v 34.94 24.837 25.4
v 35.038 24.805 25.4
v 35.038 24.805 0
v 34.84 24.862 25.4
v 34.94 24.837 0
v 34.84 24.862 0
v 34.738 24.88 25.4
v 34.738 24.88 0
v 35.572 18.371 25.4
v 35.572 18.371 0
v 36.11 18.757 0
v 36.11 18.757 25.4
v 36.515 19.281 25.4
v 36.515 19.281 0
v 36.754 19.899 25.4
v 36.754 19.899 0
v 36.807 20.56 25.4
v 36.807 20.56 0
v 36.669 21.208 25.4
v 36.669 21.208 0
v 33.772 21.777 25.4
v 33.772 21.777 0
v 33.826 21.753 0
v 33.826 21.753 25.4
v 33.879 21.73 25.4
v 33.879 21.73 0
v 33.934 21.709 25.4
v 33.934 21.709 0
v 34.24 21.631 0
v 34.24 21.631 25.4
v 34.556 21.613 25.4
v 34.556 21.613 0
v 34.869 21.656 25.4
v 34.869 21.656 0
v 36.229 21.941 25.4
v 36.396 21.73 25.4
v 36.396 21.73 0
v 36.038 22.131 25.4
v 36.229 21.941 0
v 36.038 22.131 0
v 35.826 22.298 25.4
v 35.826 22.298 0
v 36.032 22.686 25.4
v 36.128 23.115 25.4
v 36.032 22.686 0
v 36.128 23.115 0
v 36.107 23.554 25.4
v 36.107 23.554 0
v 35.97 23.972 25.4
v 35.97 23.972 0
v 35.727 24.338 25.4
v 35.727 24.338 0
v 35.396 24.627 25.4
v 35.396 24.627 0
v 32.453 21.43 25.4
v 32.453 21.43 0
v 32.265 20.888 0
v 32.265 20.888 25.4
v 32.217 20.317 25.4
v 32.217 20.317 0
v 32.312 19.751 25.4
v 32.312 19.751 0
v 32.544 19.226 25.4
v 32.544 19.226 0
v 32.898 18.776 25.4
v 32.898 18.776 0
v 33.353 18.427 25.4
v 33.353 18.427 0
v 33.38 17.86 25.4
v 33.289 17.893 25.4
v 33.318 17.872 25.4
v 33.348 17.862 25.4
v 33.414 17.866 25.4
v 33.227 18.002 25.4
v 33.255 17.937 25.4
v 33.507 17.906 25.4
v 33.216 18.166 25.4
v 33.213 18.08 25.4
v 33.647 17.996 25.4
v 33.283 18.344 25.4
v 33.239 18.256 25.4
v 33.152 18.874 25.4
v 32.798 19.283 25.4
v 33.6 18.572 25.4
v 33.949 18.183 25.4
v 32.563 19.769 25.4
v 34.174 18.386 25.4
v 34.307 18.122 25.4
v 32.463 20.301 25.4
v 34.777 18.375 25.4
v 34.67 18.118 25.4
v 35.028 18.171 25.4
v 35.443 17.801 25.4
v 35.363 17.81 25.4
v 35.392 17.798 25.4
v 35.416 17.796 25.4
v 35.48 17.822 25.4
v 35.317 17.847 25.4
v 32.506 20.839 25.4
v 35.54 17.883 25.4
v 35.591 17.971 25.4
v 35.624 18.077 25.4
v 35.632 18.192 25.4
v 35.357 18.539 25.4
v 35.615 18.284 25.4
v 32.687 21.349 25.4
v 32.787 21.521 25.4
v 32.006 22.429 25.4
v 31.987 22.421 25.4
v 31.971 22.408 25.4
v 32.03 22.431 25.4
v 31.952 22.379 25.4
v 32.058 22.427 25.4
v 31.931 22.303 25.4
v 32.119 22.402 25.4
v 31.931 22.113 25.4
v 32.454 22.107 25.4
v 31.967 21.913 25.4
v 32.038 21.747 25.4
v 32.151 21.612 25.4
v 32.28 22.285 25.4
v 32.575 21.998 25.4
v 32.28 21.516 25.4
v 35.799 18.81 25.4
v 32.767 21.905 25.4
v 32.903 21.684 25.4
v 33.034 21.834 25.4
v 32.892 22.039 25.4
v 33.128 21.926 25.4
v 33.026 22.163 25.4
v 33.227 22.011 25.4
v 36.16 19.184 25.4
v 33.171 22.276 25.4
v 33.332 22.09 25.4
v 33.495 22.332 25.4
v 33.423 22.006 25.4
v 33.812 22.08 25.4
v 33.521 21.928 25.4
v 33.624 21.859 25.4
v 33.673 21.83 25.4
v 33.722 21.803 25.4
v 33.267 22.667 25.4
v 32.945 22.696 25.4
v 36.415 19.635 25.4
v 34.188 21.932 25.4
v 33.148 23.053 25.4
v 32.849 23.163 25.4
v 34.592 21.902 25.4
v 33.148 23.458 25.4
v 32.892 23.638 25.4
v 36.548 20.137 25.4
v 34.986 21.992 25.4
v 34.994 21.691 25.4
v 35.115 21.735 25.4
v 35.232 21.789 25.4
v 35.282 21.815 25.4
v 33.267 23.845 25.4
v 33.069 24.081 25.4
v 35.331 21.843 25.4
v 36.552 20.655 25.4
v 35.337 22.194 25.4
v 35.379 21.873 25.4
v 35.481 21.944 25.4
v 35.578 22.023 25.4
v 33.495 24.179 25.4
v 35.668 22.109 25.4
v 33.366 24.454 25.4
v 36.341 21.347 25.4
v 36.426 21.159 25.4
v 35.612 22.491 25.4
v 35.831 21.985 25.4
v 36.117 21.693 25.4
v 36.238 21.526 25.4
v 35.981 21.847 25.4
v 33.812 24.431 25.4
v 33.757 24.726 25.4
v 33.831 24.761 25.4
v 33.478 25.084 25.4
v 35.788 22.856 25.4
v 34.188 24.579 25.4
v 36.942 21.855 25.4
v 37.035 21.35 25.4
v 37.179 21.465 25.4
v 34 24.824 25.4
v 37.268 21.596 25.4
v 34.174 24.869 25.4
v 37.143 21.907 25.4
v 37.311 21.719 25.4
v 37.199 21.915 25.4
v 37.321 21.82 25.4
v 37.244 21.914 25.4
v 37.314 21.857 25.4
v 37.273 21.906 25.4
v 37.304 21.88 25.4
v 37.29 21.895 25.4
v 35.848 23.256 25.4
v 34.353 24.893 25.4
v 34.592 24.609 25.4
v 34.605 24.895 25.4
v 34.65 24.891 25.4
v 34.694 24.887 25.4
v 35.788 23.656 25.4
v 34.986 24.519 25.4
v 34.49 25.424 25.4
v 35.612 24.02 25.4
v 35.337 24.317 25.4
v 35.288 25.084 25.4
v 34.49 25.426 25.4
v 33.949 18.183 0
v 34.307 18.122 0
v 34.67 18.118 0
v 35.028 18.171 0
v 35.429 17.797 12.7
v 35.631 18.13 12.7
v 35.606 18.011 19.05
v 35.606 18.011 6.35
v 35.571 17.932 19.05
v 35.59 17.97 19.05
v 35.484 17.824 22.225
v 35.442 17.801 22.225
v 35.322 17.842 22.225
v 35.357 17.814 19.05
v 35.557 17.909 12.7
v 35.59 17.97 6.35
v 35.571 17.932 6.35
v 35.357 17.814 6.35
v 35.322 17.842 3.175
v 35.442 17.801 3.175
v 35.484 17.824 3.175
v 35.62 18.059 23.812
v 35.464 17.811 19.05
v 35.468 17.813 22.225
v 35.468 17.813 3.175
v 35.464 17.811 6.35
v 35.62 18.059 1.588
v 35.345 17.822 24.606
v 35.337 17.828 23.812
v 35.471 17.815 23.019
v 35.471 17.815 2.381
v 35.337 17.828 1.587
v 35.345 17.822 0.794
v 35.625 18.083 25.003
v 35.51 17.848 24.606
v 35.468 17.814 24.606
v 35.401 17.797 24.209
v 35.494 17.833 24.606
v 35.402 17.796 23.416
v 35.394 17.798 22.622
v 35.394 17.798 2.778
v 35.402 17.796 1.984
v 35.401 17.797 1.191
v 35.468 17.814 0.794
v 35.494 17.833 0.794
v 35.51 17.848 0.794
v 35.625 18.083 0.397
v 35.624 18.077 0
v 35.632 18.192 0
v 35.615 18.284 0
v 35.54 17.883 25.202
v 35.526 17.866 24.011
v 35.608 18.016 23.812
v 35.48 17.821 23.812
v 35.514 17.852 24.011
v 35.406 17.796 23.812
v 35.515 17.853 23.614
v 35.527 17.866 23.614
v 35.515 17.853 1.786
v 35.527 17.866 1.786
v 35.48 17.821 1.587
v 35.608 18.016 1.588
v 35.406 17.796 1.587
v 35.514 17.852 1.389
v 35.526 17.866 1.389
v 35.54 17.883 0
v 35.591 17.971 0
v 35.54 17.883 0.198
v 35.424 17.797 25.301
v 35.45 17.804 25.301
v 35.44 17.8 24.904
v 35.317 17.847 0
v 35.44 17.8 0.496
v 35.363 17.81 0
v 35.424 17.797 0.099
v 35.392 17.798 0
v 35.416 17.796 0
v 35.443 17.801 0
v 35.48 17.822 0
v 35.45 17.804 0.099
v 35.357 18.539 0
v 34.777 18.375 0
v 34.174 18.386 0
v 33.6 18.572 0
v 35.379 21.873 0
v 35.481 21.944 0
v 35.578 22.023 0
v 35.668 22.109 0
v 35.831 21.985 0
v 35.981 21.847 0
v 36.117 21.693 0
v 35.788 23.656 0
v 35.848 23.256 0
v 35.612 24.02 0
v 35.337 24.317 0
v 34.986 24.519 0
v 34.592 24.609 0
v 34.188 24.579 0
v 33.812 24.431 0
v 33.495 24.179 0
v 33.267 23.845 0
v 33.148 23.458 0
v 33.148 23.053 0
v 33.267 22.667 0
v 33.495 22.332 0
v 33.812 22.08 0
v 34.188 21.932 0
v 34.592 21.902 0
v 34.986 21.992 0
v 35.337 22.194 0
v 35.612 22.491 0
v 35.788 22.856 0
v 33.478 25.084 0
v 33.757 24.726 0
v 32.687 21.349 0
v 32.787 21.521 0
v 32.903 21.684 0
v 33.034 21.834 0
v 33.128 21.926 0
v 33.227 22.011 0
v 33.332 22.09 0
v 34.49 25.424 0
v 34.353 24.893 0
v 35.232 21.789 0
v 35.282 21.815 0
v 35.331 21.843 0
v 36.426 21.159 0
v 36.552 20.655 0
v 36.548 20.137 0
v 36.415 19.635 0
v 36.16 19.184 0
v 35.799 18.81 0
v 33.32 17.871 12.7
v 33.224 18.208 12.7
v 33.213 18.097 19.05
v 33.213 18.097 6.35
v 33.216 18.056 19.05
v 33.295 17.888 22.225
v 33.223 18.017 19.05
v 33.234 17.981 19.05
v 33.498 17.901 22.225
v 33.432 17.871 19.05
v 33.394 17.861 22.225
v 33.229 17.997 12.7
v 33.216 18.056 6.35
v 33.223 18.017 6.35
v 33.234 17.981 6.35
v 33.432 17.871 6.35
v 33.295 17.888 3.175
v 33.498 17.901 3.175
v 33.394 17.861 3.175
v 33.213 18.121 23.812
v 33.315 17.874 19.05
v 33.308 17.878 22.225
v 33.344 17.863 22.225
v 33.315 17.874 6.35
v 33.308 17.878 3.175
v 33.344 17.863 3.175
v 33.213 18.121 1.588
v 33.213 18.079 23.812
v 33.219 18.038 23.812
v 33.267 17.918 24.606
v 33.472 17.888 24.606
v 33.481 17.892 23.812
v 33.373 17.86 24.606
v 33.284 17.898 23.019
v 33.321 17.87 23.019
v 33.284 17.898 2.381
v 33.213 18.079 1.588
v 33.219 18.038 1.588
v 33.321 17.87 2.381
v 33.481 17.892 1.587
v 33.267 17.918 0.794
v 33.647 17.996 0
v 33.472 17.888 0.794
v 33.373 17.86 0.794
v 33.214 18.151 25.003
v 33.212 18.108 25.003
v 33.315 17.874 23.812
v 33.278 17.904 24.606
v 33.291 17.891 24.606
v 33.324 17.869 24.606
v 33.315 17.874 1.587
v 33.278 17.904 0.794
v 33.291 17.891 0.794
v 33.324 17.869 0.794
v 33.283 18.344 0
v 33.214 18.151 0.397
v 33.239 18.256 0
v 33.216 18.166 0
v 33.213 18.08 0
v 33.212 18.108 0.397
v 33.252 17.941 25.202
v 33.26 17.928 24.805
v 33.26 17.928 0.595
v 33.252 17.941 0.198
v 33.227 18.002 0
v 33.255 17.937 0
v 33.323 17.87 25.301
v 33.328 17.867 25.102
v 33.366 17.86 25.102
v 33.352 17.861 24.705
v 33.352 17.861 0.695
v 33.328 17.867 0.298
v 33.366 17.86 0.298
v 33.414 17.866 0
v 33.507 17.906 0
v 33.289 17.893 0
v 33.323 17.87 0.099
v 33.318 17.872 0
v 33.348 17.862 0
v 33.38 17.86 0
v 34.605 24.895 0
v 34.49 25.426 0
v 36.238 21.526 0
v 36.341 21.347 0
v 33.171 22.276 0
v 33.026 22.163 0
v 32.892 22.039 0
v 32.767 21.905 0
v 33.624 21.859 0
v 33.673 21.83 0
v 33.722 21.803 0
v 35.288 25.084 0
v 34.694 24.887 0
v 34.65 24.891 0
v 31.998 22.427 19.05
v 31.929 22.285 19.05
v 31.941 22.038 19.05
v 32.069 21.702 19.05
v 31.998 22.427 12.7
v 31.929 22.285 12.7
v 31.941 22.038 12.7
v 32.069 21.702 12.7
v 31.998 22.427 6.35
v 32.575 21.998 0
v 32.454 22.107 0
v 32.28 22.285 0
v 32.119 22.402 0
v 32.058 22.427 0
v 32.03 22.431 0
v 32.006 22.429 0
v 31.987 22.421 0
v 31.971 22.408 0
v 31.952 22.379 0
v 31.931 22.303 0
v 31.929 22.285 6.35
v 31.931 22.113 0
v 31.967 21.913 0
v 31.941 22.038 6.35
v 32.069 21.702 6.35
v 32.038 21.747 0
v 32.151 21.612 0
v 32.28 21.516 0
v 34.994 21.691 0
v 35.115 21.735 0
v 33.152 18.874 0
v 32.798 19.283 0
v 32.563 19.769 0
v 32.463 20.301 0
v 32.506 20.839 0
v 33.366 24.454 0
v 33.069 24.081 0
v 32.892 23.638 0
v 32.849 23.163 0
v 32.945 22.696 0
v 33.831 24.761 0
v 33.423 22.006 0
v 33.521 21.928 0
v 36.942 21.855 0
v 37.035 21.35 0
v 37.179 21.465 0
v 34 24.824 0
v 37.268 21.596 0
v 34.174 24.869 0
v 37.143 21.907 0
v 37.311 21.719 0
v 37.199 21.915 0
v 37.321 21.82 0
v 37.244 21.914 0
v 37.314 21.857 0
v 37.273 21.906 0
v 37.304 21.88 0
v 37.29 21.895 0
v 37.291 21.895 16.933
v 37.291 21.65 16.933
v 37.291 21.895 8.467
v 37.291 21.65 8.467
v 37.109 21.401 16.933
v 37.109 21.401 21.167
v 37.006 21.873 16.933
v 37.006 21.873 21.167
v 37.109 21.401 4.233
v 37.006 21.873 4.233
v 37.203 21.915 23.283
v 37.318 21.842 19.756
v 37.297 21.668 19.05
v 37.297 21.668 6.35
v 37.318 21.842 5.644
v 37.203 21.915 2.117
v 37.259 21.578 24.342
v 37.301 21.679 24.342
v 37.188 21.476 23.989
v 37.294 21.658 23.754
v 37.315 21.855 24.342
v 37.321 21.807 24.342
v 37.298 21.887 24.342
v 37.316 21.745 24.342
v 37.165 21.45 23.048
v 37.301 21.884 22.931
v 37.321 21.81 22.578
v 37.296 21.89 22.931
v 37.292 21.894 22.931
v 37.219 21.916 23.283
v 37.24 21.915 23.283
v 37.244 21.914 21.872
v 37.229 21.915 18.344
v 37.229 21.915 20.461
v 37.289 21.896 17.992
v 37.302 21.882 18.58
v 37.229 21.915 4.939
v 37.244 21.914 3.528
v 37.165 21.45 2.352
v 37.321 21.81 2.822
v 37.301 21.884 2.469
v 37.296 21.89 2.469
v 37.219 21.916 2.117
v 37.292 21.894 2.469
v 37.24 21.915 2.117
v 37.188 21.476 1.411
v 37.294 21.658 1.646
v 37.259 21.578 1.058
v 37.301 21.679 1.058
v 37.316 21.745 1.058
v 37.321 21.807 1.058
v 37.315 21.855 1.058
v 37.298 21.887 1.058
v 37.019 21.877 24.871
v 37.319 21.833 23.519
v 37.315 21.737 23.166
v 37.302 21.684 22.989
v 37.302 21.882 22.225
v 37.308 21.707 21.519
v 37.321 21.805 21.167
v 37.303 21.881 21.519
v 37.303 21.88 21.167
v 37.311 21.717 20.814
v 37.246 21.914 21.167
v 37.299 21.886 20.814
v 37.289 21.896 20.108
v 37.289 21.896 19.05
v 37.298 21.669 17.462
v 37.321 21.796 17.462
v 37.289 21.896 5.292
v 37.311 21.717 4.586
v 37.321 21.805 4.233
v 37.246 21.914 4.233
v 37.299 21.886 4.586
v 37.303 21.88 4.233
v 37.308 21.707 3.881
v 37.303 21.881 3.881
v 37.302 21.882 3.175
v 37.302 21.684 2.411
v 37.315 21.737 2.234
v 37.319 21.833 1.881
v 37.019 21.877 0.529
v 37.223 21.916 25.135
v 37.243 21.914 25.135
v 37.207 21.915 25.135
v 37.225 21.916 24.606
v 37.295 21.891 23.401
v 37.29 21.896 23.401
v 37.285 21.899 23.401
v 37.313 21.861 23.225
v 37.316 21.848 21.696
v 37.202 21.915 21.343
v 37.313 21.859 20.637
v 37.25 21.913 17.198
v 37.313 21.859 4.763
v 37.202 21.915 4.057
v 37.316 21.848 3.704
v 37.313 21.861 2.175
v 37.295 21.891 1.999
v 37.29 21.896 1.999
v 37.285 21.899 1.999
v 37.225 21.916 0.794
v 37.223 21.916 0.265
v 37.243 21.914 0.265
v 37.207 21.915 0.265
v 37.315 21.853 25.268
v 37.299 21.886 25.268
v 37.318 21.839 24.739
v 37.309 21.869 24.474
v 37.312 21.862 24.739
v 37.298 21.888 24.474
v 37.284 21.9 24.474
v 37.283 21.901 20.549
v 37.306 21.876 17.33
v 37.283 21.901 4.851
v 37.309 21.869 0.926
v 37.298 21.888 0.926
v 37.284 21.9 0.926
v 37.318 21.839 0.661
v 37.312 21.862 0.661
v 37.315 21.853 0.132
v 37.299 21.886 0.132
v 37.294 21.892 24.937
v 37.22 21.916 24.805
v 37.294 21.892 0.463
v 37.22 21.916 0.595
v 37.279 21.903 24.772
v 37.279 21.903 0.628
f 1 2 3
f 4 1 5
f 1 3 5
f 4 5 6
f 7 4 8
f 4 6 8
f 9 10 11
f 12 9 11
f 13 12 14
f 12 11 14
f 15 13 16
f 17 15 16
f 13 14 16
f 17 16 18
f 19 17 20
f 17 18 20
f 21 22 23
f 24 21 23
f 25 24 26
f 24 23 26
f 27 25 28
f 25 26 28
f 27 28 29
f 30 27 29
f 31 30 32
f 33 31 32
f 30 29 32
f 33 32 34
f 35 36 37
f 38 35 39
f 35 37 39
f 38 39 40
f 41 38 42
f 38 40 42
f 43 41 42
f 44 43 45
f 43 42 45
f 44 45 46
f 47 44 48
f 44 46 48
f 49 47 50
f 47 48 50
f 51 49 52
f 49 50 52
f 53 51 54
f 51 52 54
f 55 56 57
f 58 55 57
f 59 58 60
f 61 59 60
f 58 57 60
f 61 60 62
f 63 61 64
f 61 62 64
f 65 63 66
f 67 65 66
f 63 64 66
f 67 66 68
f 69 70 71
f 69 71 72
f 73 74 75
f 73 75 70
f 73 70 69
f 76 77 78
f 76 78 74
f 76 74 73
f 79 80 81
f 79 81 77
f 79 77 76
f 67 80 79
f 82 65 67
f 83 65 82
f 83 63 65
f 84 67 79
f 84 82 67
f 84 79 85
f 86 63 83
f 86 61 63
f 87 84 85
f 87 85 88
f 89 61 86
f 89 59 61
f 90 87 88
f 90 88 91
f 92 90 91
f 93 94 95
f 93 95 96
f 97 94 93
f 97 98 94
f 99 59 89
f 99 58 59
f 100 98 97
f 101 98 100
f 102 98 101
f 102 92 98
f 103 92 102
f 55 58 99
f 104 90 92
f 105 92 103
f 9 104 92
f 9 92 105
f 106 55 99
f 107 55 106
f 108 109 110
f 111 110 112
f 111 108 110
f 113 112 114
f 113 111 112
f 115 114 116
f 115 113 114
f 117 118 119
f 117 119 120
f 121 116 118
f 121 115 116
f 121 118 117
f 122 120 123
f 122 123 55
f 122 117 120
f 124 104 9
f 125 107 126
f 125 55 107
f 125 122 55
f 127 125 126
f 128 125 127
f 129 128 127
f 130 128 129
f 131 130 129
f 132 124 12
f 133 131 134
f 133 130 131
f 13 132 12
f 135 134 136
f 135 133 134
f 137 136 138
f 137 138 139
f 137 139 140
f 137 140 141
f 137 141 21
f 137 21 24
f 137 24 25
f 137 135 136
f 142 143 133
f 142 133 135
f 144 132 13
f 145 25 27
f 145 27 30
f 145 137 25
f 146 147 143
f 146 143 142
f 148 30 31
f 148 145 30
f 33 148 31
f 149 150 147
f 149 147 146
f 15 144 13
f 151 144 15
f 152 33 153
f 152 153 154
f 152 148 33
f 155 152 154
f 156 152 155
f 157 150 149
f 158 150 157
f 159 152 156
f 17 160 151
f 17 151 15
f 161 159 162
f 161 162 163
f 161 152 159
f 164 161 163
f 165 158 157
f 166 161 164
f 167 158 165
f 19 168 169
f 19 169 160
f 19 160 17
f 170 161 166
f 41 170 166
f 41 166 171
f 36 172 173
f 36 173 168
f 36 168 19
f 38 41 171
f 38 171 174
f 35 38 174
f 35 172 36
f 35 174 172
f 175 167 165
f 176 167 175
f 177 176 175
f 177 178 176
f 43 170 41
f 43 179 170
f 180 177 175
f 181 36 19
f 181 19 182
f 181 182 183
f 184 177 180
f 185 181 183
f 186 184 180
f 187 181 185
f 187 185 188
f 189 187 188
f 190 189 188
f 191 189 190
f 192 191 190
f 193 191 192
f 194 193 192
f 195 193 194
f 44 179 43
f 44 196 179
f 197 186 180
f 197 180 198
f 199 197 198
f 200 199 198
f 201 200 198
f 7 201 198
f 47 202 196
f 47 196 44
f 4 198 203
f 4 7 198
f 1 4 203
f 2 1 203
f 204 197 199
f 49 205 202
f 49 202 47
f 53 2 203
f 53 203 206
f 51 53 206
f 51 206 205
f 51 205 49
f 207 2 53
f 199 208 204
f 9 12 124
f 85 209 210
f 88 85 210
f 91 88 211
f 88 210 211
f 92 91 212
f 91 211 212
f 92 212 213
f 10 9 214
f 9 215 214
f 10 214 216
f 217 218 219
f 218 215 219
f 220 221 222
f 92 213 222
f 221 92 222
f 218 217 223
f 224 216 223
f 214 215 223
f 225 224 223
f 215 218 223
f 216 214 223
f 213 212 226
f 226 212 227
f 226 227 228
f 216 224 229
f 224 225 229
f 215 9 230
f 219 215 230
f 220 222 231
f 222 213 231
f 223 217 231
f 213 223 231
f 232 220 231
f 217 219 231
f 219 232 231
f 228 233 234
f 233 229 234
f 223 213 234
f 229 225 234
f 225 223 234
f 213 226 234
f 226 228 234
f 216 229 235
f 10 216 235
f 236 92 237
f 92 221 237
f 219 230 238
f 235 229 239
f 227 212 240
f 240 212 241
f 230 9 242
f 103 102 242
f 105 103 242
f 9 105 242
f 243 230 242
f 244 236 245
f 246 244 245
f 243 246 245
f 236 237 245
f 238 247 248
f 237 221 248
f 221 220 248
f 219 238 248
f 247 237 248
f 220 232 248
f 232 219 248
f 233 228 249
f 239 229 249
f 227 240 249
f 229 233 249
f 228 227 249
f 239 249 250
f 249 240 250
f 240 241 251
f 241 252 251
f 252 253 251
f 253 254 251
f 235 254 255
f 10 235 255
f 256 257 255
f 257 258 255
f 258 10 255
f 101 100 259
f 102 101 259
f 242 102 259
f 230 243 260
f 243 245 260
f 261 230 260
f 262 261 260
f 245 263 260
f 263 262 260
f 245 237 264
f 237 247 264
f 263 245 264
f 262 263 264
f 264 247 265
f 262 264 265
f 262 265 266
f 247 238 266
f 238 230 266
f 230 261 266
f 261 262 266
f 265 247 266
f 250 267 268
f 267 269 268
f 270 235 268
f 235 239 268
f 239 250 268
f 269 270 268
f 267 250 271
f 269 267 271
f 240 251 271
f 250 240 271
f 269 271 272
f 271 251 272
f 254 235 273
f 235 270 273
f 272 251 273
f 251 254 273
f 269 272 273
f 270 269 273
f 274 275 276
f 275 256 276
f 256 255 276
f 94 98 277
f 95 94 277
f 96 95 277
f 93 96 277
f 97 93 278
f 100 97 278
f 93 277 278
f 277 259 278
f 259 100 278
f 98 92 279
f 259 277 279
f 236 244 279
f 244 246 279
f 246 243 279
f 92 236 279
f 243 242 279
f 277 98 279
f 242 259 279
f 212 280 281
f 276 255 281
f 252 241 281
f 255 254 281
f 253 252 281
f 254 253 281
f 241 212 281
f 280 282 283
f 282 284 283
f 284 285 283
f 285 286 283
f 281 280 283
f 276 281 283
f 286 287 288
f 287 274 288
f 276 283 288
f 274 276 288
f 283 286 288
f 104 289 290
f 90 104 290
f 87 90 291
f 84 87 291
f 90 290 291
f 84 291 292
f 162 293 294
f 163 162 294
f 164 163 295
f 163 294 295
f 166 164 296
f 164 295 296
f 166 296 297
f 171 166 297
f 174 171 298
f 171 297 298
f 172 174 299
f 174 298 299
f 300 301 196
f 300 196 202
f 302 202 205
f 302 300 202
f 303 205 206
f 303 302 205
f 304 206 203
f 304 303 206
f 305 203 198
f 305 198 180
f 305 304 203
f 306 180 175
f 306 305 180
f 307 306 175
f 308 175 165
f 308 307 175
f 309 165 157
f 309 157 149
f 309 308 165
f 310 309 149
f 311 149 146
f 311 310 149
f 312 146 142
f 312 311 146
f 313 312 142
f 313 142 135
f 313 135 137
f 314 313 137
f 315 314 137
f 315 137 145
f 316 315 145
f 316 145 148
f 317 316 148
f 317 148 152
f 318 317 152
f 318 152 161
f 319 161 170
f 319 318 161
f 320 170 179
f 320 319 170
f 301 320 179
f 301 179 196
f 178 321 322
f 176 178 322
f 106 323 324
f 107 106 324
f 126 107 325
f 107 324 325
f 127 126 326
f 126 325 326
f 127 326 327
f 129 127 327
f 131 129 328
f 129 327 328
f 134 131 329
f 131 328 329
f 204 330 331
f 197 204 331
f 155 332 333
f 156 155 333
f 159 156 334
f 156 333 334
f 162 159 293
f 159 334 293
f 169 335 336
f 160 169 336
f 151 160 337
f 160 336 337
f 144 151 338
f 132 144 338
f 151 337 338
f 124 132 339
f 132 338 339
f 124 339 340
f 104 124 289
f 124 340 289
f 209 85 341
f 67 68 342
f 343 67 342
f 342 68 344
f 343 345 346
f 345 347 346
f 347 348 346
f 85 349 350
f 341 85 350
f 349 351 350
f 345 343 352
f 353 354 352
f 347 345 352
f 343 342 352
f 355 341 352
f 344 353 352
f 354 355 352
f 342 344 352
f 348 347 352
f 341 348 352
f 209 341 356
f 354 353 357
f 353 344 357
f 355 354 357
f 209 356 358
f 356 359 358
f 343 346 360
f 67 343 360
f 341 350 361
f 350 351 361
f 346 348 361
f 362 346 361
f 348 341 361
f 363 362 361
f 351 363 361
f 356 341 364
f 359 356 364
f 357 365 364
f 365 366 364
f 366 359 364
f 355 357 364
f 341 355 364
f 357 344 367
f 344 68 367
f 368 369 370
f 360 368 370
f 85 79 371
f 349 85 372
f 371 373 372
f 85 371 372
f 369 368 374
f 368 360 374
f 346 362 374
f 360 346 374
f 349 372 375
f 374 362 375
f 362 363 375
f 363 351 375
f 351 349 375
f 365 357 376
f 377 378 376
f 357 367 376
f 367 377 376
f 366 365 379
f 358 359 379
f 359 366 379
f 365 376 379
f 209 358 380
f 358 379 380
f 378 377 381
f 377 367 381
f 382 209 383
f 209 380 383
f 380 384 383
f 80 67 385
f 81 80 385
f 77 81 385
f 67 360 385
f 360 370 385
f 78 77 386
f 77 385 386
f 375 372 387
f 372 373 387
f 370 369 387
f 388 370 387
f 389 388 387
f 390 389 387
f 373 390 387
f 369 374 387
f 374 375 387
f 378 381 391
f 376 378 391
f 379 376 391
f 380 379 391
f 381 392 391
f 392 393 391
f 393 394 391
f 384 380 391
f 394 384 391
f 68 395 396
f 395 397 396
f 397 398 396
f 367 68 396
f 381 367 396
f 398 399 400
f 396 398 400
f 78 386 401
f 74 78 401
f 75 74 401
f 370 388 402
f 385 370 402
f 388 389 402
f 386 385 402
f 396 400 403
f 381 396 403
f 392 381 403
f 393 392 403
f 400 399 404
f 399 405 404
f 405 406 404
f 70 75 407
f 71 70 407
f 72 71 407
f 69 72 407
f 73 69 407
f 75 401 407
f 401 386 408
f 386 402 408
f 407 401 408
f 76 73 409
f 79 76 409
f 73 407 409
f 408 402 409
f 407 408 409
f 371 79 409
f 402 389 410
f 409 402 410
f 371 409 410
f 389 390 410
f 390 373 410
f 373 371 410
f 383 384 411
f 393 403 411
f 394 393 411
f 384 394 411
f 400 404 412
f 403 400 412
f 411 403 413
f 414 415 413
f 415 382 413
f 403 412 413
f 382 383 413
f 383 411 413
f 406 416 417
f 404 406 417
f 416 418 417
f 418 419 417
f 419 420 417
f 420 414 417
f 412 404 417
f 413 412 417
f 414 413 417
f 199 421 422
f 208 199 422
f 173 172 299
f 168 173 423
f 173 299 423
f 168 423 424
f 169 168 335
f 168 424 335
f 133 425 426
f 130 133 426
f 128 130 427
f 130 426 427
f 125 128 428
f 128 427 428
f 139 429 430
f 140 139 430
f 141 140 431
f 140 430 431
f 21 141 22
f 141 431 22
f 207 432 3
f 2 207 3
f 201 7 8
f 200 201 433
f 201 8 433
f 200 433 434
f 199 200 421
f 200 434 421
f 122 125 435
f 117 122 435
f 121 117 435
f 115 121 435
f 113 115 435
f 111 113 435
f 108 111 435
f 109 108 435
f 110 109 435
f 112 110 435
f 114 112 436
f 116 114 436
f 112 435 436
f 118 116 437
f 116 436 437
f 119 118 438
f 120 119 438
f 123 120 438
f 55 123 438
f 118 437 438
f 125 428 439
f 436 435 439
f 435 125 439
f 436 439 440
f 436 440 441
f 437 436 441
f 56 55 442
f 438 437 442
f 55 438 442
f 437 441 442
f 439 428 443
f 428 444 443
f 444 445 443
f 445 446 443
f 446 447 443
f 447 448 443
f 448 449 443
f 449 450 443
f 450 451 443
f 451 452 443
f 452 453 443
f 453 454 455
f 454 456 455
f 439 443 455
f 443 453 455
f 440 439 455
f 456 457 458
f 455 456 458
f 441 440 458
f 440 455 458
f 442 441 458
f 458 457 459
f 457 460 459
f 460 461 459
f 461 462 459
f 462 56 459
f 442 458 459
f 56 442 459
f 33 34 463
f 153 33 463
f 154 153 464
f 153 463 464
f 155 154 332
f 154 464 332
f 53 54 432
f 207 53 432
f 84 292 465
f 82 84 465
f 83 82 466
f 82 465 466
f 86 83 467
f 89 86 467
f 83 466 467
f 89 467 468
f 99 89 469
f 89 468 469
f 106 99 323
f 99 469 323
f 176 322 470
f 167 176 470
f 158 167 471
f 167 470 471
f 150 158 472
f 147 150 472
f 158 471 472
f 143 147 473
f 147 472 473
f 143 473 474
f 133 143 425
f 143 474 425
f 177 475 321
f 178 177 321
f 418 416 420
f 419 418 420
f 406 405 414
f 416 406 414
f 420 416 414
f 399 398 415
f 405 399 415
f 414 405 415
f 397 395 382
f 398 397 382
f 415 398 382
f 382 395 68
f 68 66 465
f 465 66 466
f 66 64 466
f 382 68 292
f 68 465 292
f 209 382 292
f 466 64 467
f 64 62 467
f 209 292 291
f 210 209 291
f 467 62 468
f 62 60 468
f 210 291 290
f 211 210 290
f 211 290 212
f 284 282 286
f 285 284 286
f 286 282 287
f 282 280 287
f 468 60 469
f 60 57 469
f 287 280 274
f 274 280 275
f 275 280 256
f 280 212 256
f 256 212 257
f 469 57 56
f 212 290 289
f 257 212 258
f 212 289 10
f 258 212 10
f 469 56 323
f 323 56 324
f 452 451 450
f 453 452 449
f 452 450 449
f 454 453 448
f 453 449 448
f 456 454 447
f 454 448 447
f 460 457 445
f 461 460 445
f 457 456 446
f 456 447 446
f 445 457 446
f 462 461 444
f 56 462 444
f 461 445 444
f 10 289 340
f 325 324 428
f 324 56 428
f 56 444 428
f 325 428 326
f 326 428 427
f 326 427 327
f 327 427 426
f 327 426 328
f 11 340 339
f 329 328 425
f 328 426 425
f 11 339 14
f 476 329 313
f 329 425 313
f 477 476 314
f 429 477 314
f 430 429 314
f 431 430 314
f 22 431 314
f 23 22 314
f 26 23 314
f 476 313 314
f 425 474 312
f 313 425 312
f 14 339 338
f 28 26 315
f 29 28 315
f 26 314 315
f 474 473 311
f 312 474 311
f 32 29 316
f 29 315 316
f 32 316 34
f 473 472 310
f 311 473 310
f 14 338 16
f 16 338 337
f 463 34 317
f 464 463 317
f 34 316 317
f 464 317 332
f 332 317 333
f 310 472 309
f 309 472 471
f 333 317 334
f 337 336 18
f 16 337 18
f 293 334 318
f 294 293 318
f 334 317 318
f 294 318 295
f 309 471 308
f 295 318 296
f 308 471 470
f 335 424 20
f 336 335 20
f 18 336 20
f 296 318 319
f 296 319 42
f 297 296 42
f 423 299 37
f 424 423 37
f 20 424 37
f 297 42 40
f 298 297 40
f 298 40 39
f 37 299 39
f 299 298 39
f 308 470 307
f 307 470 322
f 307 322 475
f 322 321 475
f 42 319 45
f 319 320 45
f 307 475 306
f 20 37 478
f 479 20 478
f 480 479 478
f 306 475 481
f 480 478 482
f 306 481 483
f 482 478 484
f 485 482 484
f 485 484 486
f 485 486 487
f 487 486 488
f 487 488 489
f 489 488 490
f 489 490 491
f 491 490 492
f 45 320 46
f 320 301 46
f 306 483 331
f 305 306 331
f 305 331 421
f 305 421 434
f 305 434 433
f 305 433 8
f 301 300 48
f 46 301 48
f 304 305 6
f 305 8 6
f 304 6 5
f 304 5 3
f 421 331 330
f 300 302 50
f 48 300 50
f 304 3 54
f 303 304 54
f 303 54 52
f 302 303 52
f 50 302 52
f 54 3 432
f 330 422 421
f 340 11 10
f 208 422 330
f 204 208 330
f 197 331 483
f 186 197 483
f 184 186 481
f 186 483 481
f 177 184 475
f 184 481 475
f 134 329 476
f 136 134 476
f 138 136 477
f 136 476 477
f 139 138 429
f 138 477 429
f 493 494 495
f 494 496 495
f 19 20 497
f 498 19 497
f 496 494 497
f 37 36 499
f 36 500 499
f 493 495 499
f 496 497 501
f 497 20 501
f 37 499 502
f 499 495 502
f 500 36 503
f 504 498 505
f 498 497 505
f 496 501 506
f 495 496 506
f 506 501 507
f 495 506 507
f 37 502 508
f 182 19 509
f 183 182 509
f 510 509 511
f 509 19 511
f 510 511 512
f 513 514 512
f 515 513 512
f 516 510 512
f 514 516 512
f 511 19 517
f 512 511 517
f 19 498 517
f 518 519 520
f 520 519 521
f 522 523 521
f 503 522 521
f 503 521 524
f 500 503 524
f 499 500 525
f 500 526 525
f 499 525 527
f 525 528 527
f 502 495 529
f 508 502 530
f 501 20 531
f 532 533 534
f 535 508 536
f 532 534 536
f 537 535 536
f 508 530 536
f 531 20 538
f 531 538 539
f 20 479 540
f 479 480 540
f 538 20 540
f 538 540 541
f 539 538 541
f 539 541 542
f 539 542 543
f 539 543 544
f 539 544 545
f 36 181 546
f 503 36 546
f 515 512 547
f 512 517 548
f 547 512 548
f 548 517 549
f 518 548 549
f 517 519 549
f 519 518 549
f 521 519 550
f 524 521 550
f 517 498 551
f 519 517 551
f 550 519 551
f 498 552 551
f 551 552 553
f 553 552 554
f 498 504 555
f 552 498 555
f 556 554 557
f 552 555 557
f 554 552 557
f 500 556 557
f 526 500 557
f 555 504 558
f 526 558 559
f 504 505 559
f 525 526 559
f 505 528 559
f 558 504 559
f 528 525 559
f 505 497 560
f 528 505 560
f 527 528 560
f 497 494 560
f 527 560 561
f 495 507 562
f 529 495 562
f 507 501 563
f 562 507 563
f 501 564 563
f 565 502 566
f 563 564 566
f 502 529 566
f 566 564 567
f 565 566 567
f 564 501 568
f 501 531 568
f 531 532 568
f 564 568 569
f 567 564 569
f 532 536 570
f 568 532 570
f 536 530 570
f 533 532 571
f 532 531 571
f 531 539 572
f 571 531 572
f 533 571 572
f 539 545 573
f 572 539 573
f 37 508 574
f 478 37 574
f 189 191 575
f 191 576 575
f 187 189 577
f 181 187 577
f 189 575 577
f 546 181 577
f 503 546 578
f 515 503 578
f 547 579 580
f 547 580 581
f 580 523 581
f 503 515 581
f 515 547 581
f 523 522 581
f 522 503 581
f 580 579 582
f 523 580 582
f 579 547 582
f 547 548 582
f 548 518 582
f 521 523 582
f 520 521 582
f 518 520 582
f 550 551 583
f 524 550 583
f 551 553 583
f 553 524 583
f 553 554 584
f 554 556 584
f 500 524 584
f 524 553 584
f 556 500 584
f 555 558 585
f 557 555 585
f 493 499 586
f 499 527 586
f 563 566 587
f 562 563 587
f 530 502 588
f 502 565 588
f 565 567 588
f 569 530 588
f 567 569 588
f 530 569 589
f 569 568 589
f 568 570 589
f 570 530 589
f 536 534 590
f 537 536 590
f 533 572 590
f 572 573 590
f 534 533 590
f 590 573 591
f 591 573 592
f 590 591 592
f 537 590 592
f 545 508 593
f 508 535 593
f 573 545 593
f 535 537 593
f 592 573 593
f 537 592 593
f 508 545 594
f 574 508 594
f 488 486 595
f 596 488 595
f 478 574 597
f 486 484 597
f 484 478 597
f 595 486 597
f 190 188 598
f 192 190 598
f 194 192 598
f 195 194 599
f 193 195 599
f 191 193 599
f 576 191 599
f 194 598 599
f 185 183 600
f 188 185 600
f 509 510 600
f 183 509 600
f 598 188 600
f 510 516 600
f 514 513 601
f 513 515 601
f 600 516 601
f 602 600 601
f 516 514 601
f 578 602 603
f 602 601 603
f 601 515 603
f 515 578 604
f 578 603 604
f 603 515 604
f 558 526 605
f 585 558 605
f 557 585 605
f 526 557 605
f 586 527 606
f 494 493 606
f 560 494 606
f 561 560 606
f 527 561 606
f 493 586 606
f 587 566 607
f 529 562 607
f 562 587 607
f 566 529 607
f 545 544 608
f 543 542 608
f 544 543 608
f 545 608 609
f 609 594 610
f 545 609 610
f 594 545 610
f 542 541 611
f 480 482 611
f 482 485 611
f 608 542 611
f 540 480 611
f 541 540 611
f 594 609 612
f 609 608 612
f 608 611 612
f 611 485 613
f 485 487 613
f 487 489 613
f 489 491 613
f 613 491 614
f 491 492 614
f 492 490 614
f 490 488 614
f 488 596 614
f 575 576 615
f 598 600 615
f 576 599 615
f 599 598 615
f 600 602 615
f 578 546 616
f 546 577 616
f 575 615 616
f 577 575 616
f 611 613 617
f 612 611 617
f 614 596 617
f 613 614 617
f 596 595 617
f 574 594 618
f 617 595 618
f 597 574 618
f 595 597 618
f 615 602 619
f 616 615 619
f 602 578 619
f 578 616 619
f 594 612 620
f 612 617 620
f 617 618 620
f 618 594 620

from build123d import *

# Parameters (mm, degrees)
F0_R     = 1.3574899336
F1_DEPTH = 25.4


with BuildPart() as f1:
    # F0 (on Top) → F1 (new body)
    with BuildSketch(Plane.XY):
        with BuildLine():
            Line((35.2878831327, 25.0843970505), (35.0384411812, 24.8051633126))
            ThreePointArc((35.0384411812, 24.8051633126), (34.8900331306, 24.8498952124), (34.7380711454, 24.8804475838))
            ThreePointArc((34.7380711454, 24.8804475838), (34.6718324932, 24.8891687339), (34.6052941294, 24.8951906649))
            ThreePointArc((34.6052941294, 24.8951906649), (34.4790949379, 24.8991686132), (34.3529627664, 24.8934471338))
            ThreePointArc((34.3529627664, 24.8934471338), (34.0864715287, 24.84878651), (33.8308991876, 24.7610657624))
            ThreePointArc((33.8308991876, 24.7610657624), (33.7935953989, 24.7441653158), (33.7567242747, 24.7263406713))
            ThreePointArc((33.7567242747, 24.7263406713), (32.8919741005, 23.6379870392), (33.1706458564, 22.2761322214))
            ThreePointArc((33.1706458564, 22.2761322214), (33.2477936638, 22.1799429615), (33.331935669, 22.0898081689))
            ThreePointArc((33.331935669, 22.0898081689), (33.4714507341, 21.9660817612), (33.624082862, 21.8589551498))
            ThreePointArc((33.624082862, 21.8589551498), (33.6972022109, 21.8161682858), (33.7724291489, 21.7772059613))
            ThreePointArc((33.7724291489, 21.7772059613), (33.8523875779, 21.7409790551), (33.9341661368, 21.7090728424))
            add(Edge.make_bspline(
                [(34.8690945447, 21.6562799961), (34.5503462489, 21.6638848484), (34.2300963573, 21.682290249), (33.9341661368, 21.7090728424)],
                knots=[0.8742249562, 0.8742249562, 0.8742249562, 0.8742249562, 0.9209885647, 0.9209885647, 0.9209885647, 0.9209885647], degree=3))
            ThreePointArc((34.8690945447, 21.6562799961), (35.054677069, 21.7119521289), (35.2324185413, 21.7890768896))
            ThreePointArc((35.2324185413, 21.7890768896), (35.3070019831, 21.8292572971), (35.3794159251, 21.8732274679))
            ThreePointArc((35.3794159251, 21.8732274679), (35.5302859315, 21.982821804), (35.6677706867, 22.1088004507))
            ThreePointArc((35.6677706867, 22.1088004507), (35.7504359225, 22.200291525), (35.826009436, 22.2977225363))
            ThreePointArc((35.826009436, 22.2977225363), (36.1066779775, 23.5541858288), (35.3956624922, 24.6274666939))
            Line((35.3956624922, 24.6274666939), (35.2878831327, 25.0843970505))
        make_face()
        with Locations((34.4904512167, 23.2556387782)):
            Circle(F0_R, mode=Mode.SUBTRACT)
        Polygon((34.4900014006, 25.4237678916), (34.6052941294, 24.8951906649), (34.4904512167, 25.4255086183), align=None)
        with BuildLine():
            ThreePointArc((34.3529627664, 24.8934471338), (34.4790949379, 24.8991686132), (34.6052941294, 24.8951906649))
            Line((34.6052941294, 24.8951906649), (34.4900014006, 25.4237678916))
            Line((34.4900014006, 25.4237678916), (34.3529627664, 24.8934471338))
        make_face()
        with BuildLine():
            ThreePointArc((36.3961035597, 21.729501502), (36.1361243059, 22.0387624609), (35.826009436, 22.2977225363))
            ThreePointArc((35.826009436, 22.2977225363), (35.7504359225, 22.200291525), (35.6677706867, 22.1088004507))
            ThreePointArc((35.6677706867, 22.1088004507), (35.9078628578, 21.9178867809), (36.1168310715, 21.6933326324))
            add(Edge.make_bspline(
                [(36.3961035597, 21.729501502), (36.3090749695, 21.7153973416), (36.2155393433, 21.7033827965), (36.1168310715, 21.6933326324)],
                knots=[0.7920048431, 0.7920048431, 0.7920048431, 0.7920048431, 0.8094233051, 0.8094233051, 0.8094233051, 0.8094233051], degree=3))
        make_face()
        with BuildLine():
            ThreePointArc((33.7567242747, 24.7263406713), (33.7935953989, 24.7441653158), (33.8308991876, 24.7610657624))
            Line((33.8308991876, 24.7610657624), (33.4780786019, 25.0843970505))
            Line((33.4780786019, 25.0843970505), (33.7567242747, 24.7263406713))
        make_face()
        with BuildLine():
            add(Edge.make_bspline(
                [(36.6693598159, 21.2079252289), (37.0767596252, 21.3101548698), (37.3116579362, 21.5662061593), (37.3529850038, 22.0550492964), (36.9161573246, 21.8137832496), (36.3961035597, 21.729501502)],
                knots=[0.5386602181, 0.5386602181, 0.5386602181, 0.5386602181, 0.6339632831, 0.6879179364, 0.7920048431, 0.7920048431, 0.7920048431, 0.7920048431], degree=3))
            add(Edge.make_bspline(
                [(36.3961035597, 21.729501502), (36.3090749695, 21.7153973416), (36.2155393433, 21.7033827965), (36.1168310715, 21.6933326324)],
                knots=[0.7920048431, 0.7920048431, 0.7920048431, 0.7920048431, 0.8094233051, 0.8094233051, 0.8094233051, 0.8094233051], degree=3))
            ThreePointArc((36.1168310715, 21.6933326324), (36.2914503946, 21.437661713), (36.4256376999, 21.1586396813))
            add(Edge.make_bspline(
                [(36.4256376999, 21.1586396813), (36.5143437357, 21.1731050665), (36.5960224931, 21.1895225492), (36.6693598159, 21.2079252289)],
                knots=[0.5215044131, 0.5215044131, 0.5215044131, 0.5215044131, 0.5386602181, 0.5386602181, 0.5386602181, 0.5386602181], degree=3))
        make_face()
        with BuildLine():
            ThreePointArc((35.5719280309, 18.3706314653), (36.65722528, 19.581735003), (36.6693598159, 21.2079252289))
            add(Edge.make_bspline(
                [(36.4256376999, 21.1586396813), (36.5143437357, 21.1731050665), (36.5960224931, 21.1895225492), (36.6693598159, 21.2079252289)],
                knots=[0.5215044131, 0.5215044131, 0.5215044131, 0.5215044131, 0.5386602181, 0.5386602181, 0.5386602181, 0.5386602181], degree=3))
            ThreePointArc((36.4256376999, 21.1586396813), (36.4145776308, 19.6354161553), (35.3570595451, 18.5390641437))
            add(Edge.make_bspline(
                [(35.5719280309, 18.3706314653), (35.5261594748, 18.4364082043), (35.4517435721, 18.492565667), (35.3570595451, 18.5390641437)],
                knots=[0.7349975613, 0.7349975613, 0.7349975613, 0.7349975613, 0.7758927384, 0.7758927384, 0.7758927384, 0.7758927384], degree=3))
        make_face()
        with BuildLine():
            ThreePointArc((33.331935669, 22.0898081689), (33.2477936638, 22.1799429615), (33.1706458564, 22.2761322214))
            ThreePointArc((33.1706458564, 22.2761322214), (32.9577020916, 22.1025904709), (32.7669837029, 21.9048829033))
            add(Edge.make_bspline(
                [(33.0339498666, 21.8341794774), (32.9292845175, 21.856390058), (32.8391193359, 21.8800682788), (32.7669837029, 21.9048829033)],
                knots=[0.9759112078, 0.9759112078, 0.9759112078, 0.9759112078, 1, 1, 1, 1], degree=3))
            ThreePointArc((33.0339498666, 21.8341794774), (33.1768182667, 21.9691331407), (33.331935669, 22.0898081689))
        make_face()
        with BuildLine():
            add(Edge.make_bspline(
                [(35.0284066637, 18.1708643732), (35.2170583716, 18.0273126704), (35.3967964234, 17.5080415665), (35.724938715, 18.1507306273), (35.5719280309, 18.3706314653)],
                knots=[0.4666277679, 0.4666277679, 0.4666277679, 0.4666277679, 0.5982792648, 0.7349975613, 0.7349975613, 0.7349975613, 0.7349975613], degree=3))
            add(Edge.make_bspline(
                [(35.5719280309, 18.3706314653), (35.5261594748, 18.4364082043), (35.4517435721, 18.492565667), (35.3570595451, 18.5390641437)],
                knots=[0.7349975613, 0.7349975613, 0.7349975613, 0.7349975613, 0.7758927384, 0.7758927384, 0.7758927384, 0.7758927384], degree=3))
            ThreePointArc((35.3570595451, 18.5390641437), (34.4749160162, 18.3581603594), (33.6002109549, 18.5721567153))
            add(Edge.make_bspline(
                [(33.6002109549, 18.5721567153), (33.4997142497, 18.532511366), (33.4150808726, 18.4840593538), (33.3534064783, 18.426767052)],
                knots=[0.9613097376, 0.9613097376, 0.9613097376, 0.9613097376, 1, 1, 1, 1], degree=3))
            add(Edge.make_bspline(
                [(33.3534064783, 18.426767052), (33.1417874827, 18.2301840214), (33.2663690261, 17.591909312), (33.6656467439, 18.0441057117), (33.9492281969, 18.1828270385)],
                knots=[0, 0, 0, 0, 0.132755166, 0.2818249758, 0.2818249758, 0.2818249758, 0.2818249758], degree=3))
            add(Edge.make_bspline(
                [(33.9492281969, 18.1828270385), (34.3007859291, 18.3548007502), (34.7635911229, 18.3723718084), (35.0284066637, 18.1708643732)],
                knots=[0.2818249758, 0.2818249758, 0.2818249758, 0.2818249758, 0.4666277679, 0.4666277679, 0.4666277679, 0.4666277679], degree=3))
        make_face()
        with BuildLine():
            add(Edge.make_bspline(
                [(33.0339498666, 21.8341794774), (32.9292845175, 21.856390058), (32.8391193359, 21.8800682788), (32.7669837029, 21.9048829033)],
                knots=[0.9759112078, 0.9759112078, 0.9759112078, 0.9759112078, 1, 1, 1, 1], degree=3))
            add(Edge.make_bspline(
                [(32.7669837029, 21.9048829033), (32.5380625713, 21.9836316671), (32.4459364295, 22.1591315552), (31.9189267871, 22.595742553), (31.9114951341, 21.9415604187), (32.0737037979, 21.5876444724), (32.4533377986, 21.4297287765)],
                knots=[0, 0, 0, 0, 0.0764453478, 0.1487485697, 0.2171150564, 0.3144523622, 0.3144523622, 0.3144523622, 0.3144523622], degree=3))
            add(Edge.make_bspline(
                [(32.4533377986, 21.4297287765), (32.5223607921, 21.4010174018), (32.6007834055, 21.3739582167), (32.6871630664, 21.3485875551)],
                knots=[0.3144523622, 0.3144523622, 0.3144523622, 0.3144523622, 0.3321497028, 0.3321497028, 0.3321497028, 0.3321497028], degree=3))
            ThreePointArc((32.6871630664, 21.3485875551), (32.8428207036, 21.6040495599), (33.0339498666, 21.8341794774))
        make_face()
        with BuildLine():
            ThreePointArc((33.9341661368, 21.7090728424), (34.3977909817, 21.6146837622), (34.8690945447, 21.6562799961))
            add(Edge.make_bspline(
                [(34.8690945447, 21.6562799961), (34.5503462489, 21.6638848484), (34.2300963573, 21.682290249), (33.9341661368, 21.7090728424)],
                knots=[0.8742249562, 0.8742249562, 0.8742249562, 0.8742249562, 0.9209885647, 0.9209885647, 0.9209885647, 0.9209885647], degree=3))
        make_face()
        with BuildLine():
            ThreePointArc((33.9492281969, 18.1828270385), (34.4881053263, 18.1126052324), (35.0284066637, 18.1708643732))
            add(Edge.make_bspline(
                [(33.9492281969, 18.1828270385), (34.3007859291, 18.3548007502), (34.7635911229, 18.3723718084), (35.0284066637, 18.1708643732)],
                knots=[0.2818249758, 0.2818249758, 0.2818249758, 0.2818249758, 0.4666277679, 0.4666277679, 0.4666277679, 0.4666277679], degree=3))
        make_face()
        with BuildLine():
            add(Edge.make_bspline(
                [(32.4533377986, 21.4297287765), (32.5223607921, 21.4010174018), (32.6007834055, 21.3739582167), (32.6871630664, 21.3485875551)],
                knots=[0.3144523622, 0.3144523622, 0.3144523622, 0.3144523622, 0.3321497028, 0.3321497028, 0.3321497028, 0.3321497028], degree=3))
            ThreePointArc((32.4533377986, 21.4297287765), (32.3119414487, 19.7509801737), (33.3534064783, 18.426767052))
            add(Edge.make_bspline(
                [(33.6002109549, 18.5721567153), (33.4997142497, 18.532511366), (33.4150808726, 18.4840593538), (33.3534064783, 18.426767052)],
                knots=[0.9613097376, 0.9613097376, 0.9613097376, 0.9613097376, 1, 1, 1, 1], degree=3))
            ThreePointArc((33.6002109549, 18.5721567153), (32.5632602667, 19.7694949106), (32.6871630664, 21.3485875551))
        make_face()
    extrude(amount=F1_DEPTH)


solid = f1.part
